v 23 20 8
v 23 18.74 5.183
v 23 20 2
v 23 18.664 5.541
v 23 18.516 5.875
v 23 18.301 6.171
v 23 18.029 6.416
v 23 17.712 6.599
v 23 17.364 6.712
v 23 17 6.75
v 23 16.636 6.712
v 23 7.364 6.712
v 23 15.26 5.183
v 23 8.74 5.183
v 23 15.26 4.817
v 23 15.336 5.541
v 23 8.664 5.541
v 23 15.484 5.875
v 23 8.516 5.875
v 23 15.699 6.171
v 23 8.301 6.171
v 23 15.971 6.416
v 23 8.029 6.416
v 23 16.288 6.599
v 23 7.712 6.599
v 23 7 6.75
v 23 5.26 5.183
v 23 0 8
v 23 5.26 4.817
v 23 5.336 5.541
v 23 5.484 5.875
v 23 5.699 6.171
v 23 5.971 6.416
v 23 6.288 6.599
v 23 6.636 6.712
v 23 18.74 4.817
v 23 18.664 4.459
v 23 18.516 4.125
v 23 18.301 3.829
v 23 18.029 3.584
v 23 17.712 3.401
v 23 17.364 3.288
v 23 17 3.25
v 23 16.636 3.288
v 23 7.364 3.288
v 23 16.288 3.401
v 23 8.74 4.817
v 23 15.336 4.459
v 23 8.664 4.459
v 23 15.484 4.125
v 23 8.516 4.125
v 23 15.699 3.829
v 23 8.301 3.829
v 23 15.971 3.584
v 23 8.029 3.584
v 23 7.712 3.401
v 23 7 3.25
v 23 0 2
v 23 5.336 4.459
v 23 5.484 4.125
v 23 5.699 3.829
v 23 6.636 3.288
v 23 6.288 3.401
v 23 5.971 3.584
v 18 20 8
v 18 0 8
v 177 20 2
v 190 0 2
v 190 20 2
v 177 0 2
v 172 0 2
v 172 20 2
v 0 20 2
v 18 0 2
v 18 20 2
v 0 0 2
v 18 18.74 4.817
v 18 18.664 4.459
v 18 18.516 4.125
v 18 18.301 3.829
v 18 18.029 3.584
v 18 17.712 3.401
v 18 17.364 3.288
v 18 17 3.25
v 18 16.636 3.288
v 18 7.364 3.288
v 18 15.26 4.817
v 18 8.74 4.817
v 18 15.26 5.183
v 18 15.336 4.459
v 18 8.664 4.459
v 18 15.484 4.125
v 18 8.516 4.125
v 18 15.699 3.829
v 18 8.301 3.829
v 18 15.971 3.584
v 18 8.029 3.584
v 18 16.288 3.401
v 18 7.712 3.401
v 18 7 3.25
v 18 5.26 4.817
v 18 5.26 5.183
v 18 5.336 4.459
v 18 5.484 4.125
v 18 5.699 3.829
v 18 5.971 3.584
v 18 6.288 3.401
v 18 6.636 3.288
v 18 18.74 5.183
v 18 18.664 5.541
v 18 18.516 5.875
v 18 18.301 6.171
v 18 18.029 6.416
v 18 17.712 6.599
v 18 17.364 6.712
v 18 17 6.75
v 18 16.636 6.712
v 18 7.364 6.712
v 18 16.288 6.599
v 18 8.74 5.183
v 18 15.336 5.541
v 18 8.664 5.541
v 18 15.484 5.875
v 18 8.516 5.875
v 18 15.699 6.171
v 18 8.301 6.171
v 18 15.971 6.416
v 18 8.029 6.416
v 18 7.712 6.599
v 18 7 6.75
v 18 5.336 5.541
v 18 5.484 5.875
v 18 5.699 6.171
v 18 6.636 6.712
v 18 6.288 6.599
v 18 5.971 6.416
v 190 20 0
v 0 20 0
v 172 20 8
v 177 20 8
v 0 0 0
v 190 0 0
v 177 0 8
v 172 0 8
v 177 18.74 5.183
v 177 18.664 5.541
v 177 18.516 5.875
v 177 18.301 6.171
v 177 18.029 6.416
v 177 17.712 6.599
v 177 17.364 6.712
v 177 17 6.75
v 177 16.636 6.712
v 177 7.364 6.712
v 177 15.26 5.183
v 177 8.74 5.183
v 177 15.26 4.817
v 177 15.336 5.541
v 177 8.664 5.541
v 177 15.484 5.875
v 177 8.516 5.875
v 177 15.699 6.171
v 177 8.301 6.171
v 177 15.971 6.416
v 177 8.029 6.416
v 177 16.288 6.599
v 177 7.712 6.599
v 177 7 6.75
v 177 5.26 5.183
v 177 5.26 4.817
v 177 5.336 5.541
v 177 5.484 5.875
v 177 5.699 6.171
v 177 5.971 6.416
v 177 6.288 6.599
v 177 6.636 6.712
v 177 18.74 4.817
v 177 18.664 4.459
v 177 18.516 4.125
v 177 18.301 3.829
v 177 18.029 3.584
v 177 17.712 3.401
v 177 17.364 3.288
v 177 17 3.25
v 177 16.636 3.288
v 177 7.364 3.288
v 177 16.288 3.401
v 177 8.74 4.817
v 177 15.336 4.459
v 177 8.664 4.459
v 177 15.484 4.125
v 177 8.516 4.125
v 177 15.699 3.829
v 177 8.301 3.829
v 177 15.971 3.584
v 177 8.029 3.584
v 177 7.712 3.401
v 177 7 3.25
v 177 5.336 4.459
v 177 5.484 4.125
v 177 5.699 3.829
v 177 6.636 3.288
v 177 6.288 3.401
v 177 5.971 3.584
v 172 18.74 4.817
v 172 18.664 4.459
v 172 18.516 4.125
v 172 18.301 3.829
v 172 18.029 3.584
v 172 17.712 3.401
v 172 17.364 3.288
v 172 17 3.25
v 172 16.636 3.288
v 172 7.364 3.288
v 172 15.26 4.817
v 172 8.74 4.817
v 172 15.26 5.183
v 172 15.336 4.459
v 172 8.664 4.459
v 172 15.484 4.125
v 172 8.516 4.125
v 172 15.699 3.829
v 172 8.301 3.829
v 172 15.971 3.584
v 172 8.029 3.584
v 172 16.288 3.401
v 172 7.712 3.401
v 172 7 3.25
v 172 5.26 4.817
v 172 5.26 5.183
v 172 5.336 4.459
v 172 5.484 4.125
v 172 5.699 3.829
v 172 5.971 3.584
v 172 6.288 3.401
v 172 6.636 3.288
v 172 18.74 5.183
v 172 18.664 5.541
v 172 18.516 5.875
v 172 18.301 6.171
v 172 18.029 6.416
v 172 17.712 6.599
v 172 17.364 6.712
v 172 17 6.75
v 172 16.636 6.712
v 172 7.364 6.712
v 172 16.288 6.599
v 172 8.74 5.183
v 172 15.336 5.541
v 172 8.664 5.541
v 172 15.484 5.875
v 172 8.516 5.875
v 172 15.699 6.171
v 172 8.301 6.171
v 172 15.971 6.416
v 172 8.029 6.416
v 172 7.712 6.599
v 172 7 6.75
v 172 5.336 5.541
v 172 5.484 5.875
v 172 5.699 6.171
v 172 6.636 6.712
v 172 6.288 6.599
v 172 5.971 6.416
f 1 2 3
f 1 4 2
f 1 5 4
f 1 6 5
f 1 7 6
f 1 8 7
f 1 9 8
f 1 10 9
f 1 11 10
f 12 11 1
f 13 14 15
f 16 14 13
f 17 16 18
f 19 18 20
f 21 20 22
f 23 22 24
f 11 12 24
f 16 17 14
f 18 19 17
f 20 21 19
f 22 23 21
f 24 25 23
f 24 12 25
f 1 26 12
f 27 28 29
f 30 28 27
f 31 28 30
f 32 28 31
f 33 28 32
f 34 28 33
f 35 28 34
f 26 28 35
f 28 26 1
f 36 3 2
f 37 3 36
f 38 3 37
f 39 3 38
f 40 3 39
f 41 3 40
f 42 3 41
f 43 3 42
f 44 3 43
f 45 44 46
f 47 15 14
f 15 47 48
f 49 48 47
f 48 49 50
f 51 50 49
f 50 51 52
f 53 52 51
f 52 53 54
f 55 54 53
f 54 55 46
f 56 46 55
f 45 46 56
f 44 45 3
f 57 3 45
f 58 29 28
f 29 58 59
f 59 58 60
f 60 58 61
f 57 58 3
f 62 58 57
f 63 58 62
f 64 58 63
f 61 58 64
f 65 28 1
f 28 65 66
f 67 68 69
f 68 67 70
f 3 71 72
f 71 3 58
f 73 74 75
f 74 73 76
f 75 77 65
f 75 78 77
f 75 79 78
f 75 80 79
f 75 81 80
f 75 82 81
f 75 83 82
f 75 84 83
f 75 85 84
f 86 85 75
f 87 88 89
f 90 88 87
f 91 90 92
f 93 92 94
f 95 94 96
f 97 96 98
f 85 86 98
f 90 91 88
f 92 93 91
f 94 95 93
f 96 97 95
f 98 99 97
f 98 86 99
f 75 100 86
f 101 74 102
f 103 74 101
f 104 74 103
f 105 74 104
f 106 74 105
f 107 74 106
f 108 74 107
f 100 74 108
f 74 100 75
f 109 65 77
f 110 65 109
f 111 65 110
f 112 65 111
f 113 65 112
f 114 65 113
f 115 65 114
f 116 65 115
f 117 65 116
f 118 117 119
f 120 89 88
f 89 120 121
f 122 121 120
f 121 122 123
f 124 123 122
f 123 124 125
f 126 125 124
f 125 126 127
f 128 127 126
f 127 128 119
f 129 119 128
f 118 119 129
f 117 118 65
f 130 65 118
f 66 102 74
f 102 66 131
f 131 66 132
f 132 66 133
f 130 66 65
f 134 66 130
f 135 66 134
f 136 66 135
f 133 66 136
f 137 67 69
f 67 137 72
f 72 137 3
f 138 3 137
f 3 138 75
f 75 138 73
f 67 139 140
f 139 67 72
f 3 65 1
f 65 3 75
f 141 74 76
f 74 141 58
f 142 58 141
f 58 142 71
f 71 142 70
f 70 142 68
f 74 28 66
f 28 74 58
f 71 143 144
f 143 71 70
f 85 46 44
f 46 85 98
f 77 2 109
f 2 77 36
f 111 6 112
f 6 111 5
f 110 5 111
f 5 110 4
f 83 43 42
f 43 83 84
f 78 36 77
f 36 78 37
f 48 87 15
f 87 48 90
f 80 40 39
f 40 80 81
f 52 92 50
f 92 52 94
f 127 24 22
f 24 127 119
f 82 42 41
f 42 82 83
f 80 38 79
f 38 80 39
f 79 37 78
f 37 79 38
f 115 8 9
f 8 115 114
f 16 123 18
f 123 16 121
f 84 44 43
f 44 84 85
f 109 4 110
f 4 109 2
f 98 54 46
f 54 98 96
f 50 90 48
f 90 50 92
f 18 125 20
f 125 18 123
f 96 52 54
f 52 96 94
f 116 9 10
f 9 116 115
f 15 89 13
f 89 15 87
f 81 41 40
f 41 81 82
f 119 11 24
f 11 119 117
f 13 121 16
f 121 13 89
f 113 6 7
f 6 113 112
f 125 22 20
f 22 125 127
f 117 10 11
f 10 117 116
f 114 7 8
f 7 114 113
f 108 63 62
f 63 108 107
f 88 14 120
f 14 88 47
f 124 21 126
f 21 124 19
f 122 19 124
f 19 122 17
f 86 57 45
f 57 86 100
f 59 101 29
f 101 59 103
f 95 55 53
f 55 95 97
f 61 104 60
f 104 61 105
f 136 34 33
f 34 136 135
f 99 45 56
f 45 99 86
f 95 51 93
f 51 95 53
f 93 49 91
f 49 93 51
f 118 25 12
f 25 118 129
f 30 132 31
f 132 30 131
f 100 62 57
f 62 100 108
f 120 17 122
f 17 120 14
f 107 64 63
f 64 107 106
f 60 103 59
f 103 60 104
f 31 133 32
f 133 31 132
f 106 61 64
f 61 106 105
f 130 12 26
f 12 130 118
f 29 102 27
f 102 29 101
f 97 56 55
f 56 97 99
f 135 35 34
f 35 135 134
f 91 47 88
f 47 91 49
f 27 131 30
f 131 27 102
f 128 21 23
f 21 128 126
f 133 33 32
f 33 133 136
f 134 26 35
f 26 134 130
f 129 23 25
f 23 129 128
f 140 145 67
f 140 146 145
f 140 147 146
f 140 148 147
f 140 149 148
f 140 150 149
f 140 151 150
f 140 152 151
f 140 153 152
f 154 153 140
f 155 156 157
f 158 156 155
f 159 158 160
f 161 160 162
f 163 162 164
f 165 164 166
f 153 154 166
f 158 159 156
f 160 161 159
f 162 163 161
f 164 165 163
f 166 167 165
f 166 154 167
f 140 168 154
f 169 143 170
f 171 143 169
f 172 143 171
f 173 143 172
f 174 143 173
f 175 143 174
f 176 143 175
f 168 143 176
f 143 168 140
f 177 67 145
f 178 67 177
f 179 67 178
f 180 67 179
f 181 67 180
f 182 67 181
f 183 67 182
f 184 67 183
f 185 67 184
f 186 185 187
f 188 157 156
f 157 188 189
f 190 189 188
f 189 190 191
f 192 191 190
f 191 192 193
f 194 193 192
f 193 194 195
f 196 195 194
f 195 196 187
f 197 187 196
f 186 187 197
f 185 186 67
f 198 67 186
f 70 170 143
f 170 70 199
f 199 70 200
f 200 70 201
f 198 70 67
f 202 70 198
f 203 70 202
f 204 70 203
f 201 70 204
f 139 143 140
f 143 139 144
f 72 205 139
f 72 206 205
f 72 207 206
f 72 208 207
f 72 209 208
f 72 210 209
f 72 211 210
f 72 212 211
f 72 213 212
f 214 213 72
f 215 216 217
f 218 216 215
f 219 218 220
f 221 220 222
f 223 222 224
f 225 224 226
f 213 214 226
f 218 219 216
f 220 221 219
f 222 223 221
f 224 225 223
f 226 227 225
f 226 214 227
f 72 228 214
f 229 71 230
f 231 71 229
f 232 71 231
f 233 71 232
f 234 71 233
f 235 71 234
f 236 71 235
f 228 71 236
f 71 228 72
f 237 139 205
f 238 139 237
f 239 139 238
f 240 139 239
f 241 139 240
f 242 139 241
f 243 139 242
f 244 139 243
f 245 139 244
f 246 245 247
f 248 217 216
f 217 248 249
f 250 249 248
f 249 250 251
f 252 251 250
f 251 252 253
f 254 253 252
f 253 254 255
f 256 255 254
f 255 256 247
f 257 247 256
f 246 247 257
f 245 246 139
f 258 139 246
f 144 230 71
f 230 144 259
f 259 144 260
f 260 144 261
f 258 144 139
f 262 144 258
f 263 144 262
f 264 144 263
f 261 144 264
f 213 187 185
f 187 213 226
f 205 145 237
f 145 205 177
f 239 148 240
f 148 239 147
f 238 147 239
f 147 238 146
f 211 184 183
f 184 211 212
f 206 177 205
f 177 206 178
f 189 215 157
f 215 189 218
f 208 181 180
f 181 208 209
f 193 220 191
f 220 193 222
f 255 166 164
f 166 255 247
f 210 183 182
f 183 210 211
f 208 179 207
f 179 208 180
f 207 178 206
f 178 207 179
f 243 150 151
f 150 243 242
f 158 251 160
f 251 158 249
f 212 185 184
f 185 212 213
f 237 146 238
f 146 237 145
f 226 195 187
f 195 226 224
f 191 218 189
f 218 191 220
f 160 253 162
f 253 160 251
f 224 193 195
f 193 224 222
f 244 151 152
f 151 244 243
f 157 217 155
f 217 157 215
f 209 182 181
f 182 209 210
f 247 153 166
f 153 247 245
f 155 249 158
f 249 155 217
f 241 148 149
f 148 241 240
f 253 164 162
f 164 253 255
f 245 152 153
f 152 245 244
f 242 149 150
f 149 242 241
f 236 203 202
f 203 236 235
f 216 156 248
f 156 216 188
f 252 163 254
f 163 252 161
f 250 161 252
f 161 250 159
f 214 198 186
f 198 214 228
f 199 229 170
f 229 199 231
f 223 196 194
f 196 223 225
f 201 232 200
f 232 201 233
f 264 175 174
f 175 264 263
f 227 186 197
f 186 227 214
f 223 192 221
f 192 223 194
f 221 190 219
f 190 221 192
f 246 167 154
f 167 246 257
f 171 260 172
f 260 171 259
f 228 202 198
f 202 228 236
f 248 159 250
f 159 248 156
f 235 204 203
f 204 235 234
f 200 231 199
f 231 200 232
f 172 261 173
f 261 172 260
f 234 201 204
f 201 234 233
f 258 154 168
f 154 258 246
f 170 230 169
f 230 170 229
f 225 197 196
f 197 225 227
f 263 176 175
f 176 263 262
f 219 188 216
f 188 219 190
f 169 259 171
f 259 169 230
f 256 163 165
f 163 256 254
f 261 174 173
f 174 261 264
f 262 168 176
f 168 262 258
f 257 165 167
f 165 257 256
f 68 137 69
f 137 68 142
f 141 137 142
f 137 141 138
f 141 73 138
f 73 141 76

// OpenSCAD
// file: body.scad
module m3_sockel(x, y, z, height) {
    $fn = 35;
    translate([x, y, z+height/2])
    difference() {
        cylinder(r=3.25, h=height, center=true);
        cylinder(r=1.25, h=height, center=true);
    }
}

module m3_hole(x, y, z, height) {
    $fn = 35;
    translate([x, y, z+height/2])
    cylinder(r=1.75, h=height, center=true);
}

module m3_standoff(x, y, z, height) {
    $fn = 35;
    translate([x, y, z+height/2])
    cylinder(r=3, h=height, center=true);
}

module esp_holes(x, y, z, height) {
    translate([x, y, z]) {
        m3_hole(0, 0, 0, height);
        m3_hole(47, 24, 0, height);
        m3_hole(47, 0, 0, height);
        m3_hole(0, 24, 0, height);
    }
}

module esp_standoff(x, y, z, height) {
    translate([x, y, z]) {
        difference() {
            union() {
                m3_standoff(0, 0, 0, height);
                m3_standoff(47, 24, 0, height);
                m3_standoff(47, 0, 0, height);
                m3_standoff(0, 24, 0, height);
            }
            m3_hole(0, 0, 0, height);
            m3_hole(47, 24, 0, height);
            m3_hole(47, 0, 0, height);
            m3_hole(0, 24, 0, height);
        }
    }
}

module body() {
    $fn = 35;
    difference() {
        union() {
            cube(size=[195, 30, 20]);

            translate([0, 30])
            cube(size=[70, 50, 30]);

            esp_standoff(15, 45, 4, 5);
        }
        translate([3, 3, 3])
        cube(size=[189, 24, 17]);
        translate([3, 27, 3])
        cube(size=[64, 50, 27]);

        translate([65, 49, 3])
        cube(size=[5, 15, 10]);

        translate([180, 27, 5])
        cube(size=[5, 5, 5]);

        esp_holes(15, 45, 0, 3);

        m3_hole(15, 7, 0, 3);
        m3_hole(15, 23, 0, 3);

        m3_hole(180, 7, 0, 3);
        m3_hole(180, 23, 0, 3);
    }

    m3_sockel(4.5, 4.5, 0, 20);
    m3_sockel(190.5, 4.5, 0, 20);
    m3_sockel(4.5, 25.5, 0, 20);
    m3_sockel(190.5, 25.5, 0, 20);

    m3_sockel(4.5, 34.5, 0, 30);
    m3_sockel(65.5, 34.5, 0, 30);
    m3_sockel(4.5, 75.5, 0, 30);
    m3_sockel(65.5, 75.5, 0, 30);

    translate([67, 53, 3])
    cube(size=[3, 1, 10]);

    translate([67, 59, 3])
    cube(size=[3, 1, 10]);

    esp_standoff(15, 45, 3, 1);
}

body();
// main file
use <body.scad>

module mounting_square(x, y, z) {
    $fn = 30;
    translate([x, y, z])
    difference() {
        cube(size=[5, 20, 6]);

        translate([3, 17, 3])
        rotate([0,90,0])
        cylinder(r=1.75, h=6, center=true);

        translate([3, 7, 3])
        rotate([0,90,0])
        cylinder(r=1.75, h=6, center=true);
    }
}

module mount_leg(x, y, z, deg) {
    translate([x, y, z])
    rotate([deg, 0, 0])
    translate([3, -3, -3])
    rotate([0, 0, 90]) {
        $fn = 35;
        difference() {
            union() {
                cube(size=[33, 6, 3]);
                cube(size=[3, 6, 15]);
                translate([-15, 0, -11])
                rotate([0, 30, 0]) 
                difference() {
                    cube(size=[6, 6, 30]);

                    translate([3, 3, 3])
                    rotate([90,0,0])
                    cylinder(r=1.75, h=6, center=true);

                    translate([3, 3, 13])
                    rotate([90,0,0])
                    cylinder(r=1.75, h=6, center=true);

                }
            }
            m3_hole(10.5, 3, 0, 3);
            m3_hole(26.5, 3, 0, 3);
            translate([3,-1,7.5])
            cube(size=[3, 8, 15]);
        }
        
    }
}

module mount_plate(x, y, z, deg) {
    translate([x, y, z])
    rotate([deg, 0, 0]) {
        cube(size=[190, 20, 2]);
        mounting_square(18, 0, 2);
        mounting_square(172, 0, 2);
    }
}

mount_plate(0, 0, 0, 0);
